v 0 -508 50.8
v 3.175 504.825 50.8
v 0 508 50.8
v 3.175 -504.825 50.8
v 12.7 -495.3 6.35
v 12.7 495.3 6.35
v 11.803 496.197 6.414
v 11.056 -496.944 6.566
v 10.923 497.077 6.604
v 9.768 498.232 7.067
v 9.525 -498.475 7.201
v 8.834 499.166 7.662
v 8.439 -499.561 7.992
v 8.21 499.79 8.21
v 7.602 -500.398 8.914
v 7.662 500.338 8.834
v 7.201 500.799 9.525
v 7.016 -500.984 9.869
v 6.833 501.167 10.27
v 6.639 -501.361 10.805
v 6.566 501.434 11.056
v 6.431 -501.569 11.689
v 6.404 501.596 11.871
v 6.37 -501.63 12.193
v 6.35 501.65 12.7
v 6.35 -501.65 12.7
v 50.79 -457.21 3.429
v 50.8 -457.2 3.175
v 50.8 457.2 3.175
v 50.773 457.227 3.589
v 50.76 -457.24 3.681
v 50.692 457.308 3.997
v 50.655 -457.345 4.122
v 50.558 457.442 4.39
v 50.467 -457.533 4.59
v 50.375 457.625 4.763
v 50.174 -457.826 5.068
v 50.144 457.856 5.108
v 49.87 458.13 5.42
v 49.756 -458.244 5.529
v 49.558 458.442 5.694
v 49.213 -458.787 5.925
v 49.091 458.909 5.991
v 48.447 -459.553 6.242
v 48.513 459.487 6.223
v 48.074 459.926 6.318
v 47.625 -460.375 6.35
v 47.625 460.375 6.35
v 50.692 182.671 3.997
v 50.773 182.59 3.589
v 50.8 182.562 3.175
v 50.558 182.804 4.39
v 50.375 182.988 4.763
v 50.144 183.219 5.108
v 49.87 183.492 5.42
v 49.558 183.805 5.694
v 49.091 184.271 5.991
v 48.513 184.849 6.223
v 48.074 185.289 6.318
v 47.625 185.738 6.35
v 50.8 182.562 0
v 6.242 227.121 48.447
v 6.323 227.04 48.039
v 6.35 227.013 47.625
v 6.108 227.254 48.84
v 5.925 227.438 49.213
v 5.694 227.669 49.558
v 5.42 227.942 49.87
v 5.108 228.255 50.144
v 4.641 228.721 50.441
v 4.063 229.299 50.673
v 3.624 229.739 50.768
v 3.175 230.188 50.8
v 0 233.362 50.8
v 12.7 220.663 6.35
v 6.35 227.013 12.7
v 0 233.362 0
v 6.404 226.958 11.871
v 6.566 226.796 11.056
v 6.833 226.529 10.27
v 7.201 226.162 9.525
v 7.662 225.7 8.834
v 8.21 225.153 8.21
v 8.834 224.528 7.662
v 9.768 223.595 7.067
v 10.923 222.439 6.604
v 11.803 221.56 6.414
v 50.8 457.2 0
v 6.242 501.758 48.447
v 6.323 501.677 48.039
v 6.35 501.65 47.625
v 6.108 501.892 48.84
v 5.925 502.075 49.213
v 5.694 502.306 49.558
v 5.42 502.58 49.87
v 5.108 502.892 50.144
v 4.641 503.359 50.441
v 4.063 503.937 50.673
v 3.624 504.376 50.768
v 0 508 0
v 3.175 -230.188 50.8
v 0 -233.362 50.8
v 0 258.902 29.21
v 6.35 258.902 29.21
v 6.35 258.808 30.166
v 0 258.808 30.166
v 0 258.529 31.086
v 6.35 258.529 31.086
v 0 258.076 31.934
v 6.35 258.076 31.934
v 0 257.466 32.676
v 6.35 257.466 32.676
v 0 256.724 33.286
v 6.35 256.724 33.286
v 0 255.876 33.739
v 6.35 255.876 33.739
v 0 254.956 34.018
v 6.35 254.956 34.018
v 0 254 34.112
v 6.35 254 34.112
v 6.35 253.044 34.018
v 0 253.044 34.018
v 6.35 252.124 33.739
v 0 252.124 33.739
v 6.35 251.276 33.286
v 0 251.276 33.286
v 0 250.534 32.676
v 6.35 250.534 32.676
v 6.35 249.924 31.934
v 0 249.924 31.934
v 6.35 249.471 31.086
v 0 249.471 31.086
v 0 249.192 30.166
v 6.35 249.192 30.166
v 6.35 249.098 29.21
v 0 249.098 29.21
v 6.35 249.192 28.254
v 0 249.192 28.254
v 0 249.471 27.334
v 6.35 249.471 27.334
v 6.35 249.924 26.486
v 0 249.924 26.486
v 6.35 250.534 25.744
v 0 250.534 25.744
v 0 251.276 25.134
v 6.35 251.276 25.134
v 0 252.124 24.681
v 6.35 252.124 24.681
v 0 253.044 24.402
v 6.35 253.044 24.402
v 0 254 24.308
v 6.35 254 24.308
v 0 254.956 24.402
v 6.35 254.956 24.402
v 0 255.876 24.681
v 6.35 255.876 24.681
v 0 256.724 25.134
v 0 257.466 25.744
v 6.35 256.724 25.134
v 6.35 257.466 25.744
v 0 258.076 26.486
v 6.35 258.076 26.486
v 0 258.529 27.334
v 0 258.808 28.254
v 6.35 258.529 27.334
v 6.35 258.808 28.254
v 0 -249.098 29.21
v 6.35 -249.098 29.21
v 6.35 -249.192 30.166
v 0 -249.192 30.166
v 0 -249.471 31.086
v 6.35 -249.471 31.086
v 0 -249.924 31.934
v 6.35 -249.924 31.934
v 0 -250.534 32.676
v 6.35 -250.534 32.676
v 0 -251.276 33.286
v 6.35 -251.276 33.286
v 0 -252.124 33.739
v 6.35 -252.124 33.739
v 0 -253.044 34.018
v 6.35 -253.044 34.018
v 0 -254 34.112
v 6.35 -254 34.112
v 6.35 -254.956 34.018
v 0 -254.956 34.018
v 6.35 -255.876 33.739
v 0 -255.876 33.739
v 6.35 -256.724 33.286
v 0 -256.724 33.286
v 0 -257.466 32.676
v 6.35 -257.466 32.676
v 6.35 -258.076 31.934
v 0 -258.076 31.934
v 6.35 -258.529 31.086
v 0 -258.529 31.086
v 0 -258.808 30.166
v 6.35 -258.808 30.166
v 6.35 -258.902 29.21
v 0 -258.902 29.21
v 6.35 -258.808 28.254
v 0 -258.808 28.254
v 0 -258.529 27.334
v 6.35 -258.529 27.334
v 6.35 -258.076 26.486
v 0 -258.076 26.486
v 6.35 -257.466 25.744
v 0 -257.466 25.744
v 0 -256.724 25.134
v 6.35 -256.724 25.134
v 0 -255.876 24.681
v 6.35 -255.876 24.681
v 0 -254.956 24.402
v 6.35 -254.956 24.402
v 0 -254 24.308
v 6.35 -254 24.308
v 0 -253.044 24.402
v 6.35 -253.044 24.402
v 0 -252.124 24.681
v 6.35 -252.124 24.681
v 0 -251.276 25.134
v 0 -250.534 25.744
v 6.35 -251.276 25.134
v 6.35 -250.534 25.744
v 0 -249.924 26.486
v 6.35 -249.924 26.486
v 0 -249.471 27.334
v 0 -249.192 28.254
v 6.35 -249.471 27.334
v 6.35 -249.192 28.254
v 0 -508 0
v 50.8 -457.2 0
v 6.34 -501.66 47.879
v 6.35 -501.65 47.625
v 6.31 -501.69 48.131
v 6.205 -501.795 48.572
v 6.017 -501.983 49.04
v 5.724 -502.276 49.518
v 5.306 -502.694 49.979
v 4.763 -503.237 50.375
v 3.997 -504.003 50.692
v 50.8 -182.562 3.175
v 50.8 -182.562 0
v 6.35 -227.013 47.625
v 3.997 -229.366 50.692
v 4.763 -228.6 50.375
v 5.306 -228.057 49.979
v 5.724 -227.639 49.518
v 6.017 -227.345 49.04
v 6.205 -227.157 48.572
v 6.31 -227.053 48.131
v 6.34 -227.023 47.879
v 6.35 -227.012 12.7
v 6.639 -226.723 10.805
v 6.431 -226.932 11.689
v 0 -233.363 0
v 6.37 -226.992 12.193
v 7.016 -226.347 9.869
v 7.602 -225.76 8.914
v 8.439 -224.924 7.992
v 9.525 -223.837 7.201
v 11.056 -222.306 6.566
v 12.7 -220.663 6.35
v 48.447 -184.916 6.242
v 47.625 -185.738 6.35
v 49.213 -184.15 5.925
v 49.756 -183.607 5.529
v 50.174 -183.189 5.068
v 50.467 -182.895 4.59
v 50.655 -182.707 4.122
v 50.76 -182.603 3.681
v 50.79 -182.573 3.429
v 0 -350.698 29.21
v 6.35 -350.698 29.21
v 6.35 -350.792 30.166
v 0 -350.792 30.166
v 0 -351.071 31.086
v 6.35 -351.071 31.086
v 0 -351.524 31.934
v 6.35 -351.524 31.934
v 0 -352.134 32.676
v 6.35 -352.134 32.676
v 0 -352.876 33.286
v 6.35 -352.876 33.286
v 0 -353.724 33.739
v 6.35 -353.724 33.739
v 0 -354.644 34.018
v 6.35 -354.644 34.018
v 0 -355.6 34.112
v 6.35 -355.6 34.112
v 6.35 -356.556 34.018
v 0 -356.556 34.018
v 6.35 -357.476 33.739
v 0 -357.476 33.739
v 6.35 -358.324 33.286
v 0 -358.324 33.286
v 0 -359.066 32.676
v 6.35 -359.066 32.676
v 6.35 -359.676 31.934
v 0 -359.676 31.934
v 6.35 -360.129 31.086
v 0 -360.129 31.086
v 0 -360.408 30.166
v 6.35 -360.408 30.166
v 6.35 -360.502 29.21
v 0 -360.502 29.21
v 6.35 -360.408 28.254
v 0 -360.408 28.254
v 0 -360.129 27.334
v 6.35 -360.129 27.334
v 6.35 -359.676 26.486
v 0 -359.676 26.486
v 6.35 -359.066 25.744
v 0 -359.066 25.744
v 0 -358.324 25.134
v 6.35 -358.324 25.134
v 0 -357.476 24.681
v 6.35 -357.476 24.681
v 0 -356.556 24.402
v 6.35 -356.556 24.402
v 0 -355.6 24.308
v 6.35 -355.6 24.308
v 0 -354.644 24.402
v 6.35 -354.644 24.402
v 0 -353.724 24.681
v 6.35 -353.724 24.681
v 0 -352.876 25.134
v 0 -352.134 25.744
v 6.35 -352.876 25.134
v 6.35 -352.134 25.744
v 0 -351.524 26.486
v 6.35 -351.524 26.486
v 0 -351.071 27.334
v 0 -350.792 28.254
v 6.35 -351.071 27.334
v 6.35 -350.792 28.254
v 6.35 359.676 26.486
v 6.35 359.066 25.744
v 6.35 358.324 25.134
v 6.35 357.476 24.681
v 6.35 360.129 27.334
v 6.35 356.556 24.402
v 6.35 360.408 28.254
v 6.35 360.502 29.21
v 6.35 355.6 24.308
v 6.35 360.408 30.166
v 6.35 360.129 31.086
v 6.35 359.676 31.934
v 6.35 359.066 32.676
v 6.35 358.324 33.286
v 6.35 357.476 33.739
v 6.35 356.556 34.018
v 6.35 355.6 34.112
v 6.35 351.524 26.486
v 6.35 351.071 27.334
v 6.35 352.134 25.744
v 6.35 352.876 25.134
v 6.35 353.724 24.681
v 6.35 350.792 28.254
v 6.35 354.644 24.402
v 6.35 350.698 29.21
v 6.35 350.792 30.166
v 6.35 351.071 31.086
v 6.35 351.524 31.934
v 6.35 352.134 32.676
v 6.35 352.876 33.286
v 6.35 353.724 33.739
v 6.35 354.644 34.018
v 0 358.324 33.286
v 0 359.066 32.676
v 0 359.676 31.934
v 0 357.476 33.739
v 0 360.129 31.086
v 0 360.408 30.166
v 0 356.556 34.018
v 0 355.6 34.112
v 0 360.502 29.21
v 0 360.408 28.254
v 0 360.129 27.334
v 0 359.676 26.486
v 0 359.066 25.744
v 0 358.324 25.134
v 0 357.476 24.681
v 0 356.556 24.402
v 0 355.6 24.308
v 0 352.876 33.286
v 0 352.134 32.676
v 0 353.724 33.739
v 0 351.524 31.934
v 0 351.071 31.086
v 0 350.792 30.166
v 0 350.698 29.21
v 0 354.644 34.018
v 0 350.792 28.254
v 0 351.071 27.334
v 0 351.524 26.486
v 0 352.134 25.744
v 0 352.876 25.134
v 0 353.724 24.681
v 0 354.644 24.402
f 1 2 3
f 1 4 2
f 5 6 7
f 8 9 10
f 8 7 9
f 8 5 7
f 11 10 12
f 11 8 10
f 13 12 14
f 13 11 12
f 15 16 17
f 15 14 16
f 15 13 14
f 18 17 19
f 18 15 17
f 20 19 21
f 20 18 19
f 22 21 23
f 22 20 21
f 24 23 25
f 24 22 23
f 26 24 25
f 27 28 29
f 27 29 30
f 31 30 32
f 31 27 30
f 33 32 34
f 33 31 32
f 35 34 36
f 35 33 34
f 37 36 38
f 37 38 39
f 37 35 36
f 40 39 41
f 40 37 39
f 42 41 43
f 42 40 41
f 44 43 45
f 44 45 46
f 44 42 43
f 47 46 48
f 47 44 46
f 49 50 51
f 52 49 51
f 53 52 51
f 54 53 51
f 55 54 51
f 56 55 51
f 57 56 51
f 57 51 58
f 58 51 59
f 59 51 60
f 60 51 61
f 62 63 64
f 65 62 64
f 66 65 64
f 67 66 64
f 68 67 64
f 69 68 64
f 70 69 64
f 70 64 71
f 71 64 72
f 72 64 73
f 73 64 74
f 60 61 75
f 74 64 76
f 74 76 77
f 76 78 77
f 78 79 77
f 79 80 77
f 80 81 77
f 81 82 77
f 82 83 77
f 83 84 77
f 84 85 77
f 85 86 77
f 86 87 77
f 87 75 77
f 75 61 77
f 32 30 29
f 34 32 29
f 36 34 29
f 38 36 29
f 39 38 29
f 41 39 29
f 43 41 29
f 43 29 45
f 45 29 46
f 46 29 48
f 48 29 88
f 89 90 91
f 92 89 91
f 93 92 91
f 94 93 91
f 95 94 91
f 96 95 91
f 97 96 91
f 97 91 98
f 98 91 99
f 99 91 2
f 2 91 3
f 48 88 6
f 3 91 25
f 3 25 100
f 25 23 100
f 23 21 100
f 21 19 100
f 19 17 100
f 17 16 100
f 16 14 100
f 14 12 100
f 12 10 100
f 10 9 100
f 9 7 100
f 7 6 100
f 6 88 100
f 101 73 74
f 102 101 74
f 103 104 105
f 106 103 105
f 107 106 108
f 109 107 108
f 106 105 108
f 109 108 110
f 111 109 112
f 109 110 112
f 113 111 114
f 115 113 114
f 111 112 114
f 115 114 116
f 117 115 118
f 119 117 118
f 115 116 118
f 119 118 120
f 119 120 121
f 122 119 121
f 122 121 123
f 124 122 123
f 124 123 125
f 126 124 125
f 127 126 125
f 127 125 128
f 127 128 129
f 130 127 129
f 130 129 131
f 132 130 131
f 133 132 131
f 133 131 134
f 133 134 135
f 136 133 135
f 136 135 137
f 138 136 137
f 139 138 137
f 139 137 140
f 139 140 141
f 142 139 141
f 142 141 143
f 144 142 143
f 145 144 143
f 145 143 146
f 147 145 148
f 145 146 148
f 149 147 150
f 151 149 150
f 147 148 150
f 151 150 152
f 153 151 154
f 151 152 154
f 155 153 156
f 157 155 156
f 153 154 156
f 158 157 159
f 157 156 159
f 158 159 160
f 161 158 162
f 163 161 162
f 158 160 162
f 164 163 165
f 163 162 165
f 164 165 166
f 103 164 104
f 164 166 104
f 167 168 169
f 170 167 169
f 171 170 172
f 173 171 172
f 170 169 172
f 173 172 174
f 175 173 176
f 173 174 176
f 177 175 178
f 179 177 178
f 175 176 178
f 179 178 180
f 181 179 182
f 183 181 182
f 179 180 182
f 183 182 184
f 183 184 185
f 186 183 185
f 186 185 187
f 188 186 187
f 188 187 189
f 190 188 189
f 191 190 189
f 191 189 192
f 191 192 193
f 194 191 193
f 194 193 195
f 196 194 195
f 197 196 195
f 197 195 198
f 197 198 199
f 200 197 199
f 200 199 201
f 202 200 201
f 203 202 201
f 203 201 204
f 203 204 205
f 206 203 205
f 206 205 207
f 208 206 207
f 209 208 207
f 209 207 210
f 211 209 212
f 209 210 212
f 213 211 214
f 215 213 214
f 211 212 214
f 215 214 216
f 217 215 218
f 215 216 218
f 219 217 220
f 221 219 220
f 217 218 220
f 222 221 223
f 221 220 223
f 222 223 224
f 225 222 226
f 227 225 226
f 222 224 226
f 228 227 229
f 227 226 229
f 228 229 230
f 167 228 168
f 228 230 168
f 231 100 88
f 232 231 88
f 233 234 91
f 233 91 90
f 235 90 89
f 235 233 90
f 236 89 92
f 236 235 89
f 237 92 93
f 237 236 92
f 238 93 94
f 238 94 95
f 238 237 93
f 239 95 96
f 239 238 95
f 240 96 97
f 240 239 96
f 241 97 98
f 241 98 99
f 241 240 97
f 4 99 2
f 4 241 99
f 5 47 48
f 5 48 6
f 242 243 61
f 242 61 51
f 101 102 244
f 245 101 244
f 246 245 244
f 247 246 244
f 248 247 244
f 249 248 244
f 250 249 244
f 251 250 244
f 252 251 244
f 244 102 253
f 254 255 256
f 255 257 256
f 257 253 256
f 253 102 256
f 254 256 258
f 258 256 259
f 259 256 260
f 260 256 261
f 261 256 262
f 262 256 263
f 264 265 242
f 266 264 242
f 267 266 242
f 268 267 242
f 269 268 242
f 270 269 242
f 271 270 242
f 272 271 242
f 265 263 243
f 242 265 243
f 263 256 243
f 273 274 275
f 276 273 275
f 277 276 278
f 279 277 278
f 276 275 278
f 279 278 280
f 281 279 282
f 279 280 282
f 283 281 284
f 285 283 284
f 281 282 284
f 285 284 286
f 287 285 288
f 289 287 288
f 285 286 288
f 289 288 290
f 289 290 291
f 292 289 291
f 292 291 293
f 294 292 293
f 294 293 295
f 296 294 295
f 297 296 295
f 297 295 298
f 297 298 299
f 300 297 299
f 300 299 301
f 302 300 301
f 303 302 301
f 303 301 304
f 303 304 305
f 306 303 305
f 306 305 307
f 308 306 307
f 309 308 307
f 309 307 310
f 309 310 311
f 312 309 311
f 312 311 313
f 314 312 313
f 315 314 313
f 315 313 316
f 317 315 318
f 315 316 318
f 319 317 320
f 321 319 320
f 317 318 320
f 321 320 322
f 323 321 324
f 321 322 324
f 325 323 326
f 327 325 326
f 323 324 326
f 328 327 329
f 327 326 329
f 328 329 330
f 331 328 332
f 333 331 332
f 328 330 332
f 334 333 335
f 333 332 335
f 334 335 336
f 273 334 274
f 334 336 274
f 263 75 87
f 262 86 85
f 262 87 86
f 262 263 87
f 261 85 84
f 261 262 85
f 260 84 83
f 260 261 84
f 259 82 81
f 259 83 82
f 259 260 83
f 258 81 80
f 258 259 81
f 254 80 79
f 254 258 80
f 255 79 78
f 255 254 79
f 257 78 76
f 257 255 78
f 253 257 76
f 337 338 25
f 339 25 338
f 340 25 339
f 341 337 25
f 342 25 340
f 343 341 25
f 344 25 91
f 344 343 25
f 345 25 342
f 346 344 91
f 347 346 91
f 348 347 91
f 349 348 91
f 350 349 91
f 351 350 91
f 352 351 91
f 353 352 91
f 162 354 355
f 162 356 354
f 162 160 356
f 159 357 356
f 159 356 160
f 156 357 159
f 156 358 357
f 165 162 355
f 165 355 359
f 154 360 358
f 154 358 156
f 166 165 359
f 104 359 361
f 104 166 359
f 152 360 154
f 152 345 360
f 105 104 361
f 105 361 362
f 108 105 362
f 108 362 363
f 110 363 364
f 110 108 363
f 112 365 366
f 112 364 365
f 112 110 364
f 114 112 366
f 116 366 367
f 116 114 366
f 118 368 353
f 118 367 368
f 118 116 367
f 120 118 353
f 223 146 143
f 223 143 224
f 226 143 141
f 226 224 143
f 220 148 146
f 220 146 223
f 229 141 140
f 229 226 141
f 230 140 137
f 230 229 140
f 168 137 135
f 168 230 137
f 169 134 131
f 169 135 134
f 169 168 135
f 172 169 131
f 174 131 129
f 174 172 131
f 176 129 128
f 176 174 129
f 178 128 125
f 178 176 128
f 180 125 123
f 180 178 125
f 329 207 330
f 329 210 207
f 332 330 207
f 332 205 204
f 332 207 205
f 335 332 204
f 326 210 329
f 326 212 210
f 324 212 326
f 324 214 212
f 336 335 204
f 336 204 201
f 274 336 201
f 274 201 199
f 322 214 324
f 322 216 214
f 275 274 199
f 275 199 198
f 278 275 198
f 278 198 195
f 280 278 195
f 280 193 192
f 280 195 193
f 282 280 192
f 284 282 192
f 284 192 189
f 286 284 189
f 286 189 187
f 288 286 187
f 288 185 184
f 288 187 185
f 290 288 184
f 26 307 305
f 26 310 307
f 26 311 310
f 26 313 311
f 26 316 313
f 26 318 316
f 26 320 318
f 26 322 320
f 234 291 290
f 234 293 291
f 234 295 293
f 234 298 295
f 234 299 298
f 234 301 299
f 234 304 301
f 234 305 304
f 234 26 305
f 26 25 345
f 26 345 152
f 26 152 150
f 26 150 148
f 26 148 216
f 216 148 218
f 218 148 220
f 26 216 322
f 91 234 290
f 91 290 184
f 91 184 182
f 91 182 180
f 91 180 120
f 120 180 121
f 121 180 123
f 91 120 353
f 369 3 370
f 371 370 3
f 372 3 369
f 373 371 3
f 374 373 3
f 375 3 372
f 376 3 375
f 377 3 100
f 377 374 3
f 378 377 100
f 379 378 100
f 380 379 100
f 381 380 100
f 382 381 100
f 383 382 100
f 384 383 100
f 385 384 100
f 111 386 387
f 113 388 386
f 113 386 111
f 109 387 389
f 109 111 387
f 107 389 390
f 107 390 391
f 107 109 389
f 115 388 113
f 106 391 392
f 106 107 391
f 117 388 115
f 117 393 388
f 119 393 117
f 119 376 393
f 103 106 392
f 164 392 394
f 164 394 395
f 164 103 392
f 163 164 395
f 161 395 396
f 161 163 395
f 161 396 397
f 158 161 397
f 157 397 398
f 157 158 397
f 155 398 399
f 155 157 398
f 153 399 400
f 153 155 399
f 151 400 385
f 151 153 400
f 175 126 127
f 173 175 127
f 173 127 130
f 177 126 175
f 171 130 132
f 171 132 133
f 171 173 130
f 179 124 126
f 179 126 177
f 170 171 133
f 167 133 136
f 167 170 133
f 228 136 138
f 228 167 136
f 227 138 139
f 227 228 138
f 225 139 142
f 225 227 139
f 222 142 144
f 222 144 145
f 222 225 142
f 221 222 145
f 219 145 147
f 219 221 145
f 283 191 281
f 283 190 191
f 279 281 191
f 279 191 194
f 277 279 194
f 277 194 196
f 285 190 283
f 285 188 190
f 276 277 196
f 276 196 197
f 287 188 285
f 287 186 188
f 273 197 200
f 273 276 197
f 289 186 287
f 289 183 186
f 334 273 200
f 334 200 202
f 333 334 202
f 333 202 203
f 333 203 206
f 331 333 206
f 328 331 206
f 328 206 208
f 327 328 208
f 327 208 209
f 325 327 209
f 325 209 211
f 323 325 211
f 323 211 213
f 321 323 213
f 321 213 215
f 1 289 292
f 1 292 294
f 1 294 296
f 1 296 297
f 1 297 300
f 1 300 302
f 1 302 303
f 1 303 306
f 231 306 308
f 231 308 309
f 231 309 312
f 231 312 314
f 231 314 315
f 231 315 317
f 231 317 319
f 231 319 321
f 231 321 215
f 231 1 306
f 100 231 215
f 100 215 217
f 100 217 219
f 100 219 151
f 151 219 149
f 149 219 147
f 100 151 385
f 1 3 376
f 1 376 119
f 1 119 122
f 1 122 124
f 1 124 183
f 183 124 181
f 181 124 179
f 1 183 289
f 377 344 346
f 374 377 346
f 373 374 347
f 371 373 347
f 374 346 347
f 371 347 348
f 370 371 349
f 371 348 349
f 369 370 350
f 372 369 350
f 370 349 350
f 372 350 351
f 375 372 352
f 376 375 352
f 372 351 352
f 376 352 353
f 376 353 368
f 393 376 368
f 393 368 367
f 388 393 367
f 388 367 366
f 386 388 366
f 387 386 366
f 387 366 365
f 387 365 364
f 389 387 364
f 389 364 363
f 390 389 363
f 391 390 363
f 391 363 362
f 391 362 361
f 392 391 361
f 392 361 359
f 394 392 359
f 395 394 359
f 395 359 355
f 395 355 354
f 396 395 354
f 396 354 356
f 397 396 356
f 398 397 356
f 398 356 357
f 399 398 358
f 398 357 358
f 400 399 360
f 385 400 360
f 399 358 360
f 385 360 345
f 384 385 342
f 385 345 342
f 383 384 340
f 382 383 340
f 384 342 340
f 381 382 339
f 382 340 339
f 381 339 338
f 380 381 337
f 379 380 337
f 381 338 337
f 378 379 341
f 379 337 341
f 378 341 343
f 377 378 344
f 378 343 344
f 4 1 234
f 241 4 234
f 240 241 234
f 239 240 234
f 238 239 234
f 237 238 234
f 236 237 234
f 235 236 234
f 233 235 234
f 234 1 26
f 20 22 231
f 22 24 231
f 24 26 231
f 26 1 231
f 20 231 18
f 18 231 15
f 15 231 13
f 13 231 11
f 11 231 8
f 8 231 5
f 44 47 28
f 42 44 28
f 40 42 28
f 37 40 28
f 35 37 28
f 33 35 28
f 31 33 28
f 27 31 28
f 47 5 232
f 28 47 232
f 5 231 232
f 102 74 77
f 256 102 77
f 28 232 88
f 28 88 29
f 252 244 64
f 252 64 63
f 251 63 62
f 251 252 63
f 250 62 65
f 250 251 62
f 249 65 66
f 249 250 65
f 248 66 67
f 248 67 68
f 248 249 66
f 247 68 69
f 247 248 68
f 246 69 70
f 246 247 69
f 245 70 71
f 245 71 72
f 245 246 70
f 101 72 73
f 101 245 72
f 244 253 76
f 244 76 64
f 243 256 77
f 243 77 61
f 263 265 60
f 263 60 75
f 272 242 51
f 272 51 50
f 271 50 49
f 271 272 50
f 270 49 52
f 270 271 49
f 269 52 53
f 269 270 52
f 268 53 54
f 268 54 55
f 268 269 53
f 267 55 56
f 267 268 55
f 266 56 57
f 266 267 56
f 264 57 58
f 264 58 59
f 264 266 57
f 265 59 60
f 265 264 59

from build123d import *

# Parameters (mm, degrees)
F1_DEPTH = 233.3625
F3_DEPTH = 50.801
F4_DEPTH = 508
F6_DEPTH = 50.801
F8_D     = 9.8044


with BuildPart() as f1:
    # F0 (on Front) → F1 (new body, symmetric)
    with BuildSketch(Plane.XZ):
        with BuildLine():
            Line((0, 50.8), (0, 0))
            Line((0, 0), (50.8, 0))
            Line((50.8, 0), (50.8, 3.175))
            ThreePointArc((50.8, 3.175), (49.8700640303, 5.4200640303), (47.625, 6.35))
            Line((47.625, 6.35), (12.7, 6.35))
            ThreePointArc((12.7, 6.35), (8.2098719395, 8.2098719395), (6.35, 12.7))
            Line((6.35, 12.7), (6.35, 47.625))
            ThreePointArc((6.35, 47.625), (5.4200640303, 49.8700640303), (3.175, 50.8))
            Line((3.175, 50.8), (0, 50.8))
        make_face()
    extrude(amount=F1_DEPTH, both=True)

    # F2 (on face) → F3 (cut, through all)
    with BuildSketch(Plane(origin=(0, 0, 0), x_dir=(1, 0, 0), z_dir=(0, 0, -1))):
        Polygon((50.8, 233.3625), (0, 233.3625), (50.8, 182.5625), align=None)
        Polygon((50.8, -182.5625), (0, -233.3625), (50.8, -233.3625), align=None)
    extrude(amount=-F3_DEPTH, mode=Mode.SUBTRACT)


with BuildPart() as f4:
    # F0 (on Front) → F4 (new body, symmetric)
    with BuildSketch(Plane.XZ):
        with BuildLine():
            Line((0, 50.8), (0, 0))
            Line((0, 0), (50.8, 0))
            Line((50.8, 0), (50.8, 3.175))
            ThreePointArc((50.8, 3.175), (49.8700640303, 5.4200640303), (47.625, 6.35))
            Line((47.625, 6.35), (12.7, 6.35))
            ThreePointArc((12.7, 6.35), (8.2098719395, 8.2098719395), (6.35, 12.7))
            Line((6.35, 12.7), (6.35, 47.625))
            ThreePointArc((6.35, 47.625), (5.4200640303, 49.8700640303), (3.175, 50.8))
            Line((3.175, 50.8), (0, 50.8))
        make_face()
    extrude(amount=F4_DEPTH, both=True)

    # F5 (on face) → F6 (cut, through all)
    with BuildSketch(Plane(origin=(0, 0, 0), x_dir=(1, 0, 0), z_dir=(0, 0, -1))):
        Polygon((50.8, 508), (0, 508), (50.8, 457.2), align=None)
        Polygon((50.8, -457.2), (0, -508), (50.8, -508), align=None)
    extrude(amount=-F6_DEPTH, mode=Mode.SUBTRACT)

    # F8 (through all)
    with Locations(Plane(origin=(0, 0, 0), x_dir=(0, -1, 0), z_dir=(-1, 0, 0))):
        with Locations((355.6, 29.21), (254, 29.21), (-254, 29.21), (-355.6, 29.21)):
            Hole(F8_D / 2)


solid = Compound([f1.part, f4.part])
